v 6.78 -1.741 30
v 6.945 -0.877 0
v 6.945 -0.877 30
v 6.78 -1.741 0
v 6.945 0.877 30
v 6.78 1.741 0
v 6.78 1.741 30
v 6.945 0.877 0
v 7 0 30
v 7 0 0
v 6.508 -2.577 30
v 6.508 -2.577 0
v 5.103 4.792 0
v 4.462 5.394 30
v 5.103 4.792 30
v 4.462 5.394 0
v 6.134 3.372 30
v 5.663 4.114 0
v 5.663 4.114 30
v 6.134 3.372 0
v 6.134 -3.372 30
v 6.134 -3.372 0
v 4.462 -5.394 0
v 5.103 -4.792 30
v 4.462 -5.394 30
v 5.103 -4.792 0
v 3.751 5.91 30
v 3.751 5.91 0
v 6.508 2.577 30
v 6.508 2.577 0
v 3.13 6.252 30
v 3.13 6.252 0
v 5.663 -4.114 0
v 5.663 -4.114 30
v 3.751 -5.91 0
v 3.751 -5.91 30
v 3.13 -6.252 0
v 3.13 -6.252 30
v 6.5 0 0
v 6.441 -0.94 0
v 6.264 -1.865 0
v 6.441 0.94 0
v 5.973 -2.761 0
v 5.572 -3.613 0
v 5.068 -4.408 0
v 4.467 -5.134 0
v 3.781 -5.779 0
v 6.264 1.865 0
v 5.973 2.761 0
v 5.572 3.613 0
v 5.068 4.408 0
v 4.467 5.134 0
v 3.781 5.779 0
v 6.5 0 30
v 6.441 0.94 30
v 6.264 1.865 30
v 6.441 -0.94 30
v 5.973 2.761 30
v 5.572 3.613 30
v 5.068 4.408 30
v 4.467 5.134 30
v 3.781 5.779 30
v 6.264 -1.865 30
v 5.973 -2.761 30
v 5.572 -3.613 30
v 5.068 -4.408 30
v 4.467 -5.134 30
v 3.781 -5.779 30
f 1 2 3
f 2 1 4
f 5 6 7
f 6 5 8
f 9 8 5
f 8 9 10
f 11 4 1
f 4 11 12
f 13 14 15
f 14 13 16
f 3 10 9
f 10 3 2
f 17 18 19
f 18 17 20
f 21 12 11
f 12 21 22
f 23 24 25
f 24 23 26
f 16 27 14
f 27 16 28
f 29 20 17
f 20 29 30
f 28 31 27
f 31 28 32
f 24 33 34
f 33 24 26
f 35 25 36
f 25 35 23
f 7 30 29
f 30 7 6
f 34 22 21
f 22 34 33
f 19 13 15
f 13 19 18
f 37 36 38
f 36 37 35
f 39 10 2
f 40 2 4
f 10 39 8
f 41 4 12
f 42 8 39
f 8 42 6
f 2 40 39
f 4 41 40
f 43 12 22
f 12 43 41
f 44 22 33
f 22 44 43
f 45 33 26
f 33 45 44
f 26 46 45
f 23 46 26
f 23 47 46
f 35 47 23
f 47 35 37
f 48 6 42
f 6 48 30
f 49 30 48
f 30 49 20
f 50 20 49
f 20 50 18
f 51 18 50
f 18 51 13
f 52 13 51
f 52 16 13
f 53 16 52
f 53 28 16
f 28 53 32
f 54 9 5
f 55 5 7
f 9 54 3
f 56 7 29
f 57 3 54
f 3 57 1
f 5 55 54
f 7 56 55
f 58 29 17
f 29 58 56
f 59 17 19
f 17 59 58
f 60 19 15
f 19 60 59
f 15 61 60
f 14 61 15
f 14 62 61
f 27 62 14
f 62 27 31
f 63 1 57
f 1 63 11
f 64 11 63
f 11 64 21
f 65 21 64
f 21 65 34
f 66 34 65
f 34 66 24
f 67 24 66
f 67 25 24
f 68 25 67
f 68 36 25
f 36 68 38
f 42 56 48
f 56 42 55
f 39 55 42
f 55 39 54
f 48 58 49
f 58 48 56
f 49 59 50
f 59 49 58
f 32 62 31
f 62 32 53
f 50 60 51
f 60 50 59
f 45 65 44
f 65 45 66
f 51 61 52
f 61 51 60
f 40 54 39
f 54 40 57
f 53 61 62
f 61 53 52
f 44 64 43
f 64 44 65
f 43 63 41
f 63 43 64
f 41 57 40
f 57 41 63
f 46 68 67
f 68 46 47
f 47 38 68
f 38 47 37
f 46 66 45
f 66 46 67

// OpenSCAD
$fn = 50;


difference() {
	union() {
		cylinder(h = 30, r = 7.0000000000);
		translate(v = [-4.0000000000, 0, 0]) {
			cylinder(h = 30, r = 7.0000000000);
		}
	}
	union() {
		cylinder(h = 30, r = 3.2500000000);
		cylinder(h = 30, r = 1.8000000000);
		cylinder(h = 30, r = 1.8000000000);
		cylinder(h = 30, r = 1.8000000000);
		translate(v = [-8.5000000000, 0, 0]) {
			hull() {
				translate(v = [-3.7500000000, 0.0000000000, 0]) {
					cylinder(h = 30, r = 7.5000000000);
				}
				translate(v = [3.7500000000, 0.0000000000, 0]) {
					cylinder(h = 30, r = 7.5000000000);
				}
				translate(v = [-3.7500000000, -0.0000000000, 0]) {
					cylinder(h = 30, r = 7.5000000000);
				}
				translate(v = [3.7500000000, -0.0000000000, 0]) {
					cylinder(h = 30, r = 7.5000000000);
				}
			}
		}
		translate(v = [-1.0000000000, 0, 0.0000000000]) {
			cylinder(h = 30, r = 7.5000000000);
		}
	}
}
